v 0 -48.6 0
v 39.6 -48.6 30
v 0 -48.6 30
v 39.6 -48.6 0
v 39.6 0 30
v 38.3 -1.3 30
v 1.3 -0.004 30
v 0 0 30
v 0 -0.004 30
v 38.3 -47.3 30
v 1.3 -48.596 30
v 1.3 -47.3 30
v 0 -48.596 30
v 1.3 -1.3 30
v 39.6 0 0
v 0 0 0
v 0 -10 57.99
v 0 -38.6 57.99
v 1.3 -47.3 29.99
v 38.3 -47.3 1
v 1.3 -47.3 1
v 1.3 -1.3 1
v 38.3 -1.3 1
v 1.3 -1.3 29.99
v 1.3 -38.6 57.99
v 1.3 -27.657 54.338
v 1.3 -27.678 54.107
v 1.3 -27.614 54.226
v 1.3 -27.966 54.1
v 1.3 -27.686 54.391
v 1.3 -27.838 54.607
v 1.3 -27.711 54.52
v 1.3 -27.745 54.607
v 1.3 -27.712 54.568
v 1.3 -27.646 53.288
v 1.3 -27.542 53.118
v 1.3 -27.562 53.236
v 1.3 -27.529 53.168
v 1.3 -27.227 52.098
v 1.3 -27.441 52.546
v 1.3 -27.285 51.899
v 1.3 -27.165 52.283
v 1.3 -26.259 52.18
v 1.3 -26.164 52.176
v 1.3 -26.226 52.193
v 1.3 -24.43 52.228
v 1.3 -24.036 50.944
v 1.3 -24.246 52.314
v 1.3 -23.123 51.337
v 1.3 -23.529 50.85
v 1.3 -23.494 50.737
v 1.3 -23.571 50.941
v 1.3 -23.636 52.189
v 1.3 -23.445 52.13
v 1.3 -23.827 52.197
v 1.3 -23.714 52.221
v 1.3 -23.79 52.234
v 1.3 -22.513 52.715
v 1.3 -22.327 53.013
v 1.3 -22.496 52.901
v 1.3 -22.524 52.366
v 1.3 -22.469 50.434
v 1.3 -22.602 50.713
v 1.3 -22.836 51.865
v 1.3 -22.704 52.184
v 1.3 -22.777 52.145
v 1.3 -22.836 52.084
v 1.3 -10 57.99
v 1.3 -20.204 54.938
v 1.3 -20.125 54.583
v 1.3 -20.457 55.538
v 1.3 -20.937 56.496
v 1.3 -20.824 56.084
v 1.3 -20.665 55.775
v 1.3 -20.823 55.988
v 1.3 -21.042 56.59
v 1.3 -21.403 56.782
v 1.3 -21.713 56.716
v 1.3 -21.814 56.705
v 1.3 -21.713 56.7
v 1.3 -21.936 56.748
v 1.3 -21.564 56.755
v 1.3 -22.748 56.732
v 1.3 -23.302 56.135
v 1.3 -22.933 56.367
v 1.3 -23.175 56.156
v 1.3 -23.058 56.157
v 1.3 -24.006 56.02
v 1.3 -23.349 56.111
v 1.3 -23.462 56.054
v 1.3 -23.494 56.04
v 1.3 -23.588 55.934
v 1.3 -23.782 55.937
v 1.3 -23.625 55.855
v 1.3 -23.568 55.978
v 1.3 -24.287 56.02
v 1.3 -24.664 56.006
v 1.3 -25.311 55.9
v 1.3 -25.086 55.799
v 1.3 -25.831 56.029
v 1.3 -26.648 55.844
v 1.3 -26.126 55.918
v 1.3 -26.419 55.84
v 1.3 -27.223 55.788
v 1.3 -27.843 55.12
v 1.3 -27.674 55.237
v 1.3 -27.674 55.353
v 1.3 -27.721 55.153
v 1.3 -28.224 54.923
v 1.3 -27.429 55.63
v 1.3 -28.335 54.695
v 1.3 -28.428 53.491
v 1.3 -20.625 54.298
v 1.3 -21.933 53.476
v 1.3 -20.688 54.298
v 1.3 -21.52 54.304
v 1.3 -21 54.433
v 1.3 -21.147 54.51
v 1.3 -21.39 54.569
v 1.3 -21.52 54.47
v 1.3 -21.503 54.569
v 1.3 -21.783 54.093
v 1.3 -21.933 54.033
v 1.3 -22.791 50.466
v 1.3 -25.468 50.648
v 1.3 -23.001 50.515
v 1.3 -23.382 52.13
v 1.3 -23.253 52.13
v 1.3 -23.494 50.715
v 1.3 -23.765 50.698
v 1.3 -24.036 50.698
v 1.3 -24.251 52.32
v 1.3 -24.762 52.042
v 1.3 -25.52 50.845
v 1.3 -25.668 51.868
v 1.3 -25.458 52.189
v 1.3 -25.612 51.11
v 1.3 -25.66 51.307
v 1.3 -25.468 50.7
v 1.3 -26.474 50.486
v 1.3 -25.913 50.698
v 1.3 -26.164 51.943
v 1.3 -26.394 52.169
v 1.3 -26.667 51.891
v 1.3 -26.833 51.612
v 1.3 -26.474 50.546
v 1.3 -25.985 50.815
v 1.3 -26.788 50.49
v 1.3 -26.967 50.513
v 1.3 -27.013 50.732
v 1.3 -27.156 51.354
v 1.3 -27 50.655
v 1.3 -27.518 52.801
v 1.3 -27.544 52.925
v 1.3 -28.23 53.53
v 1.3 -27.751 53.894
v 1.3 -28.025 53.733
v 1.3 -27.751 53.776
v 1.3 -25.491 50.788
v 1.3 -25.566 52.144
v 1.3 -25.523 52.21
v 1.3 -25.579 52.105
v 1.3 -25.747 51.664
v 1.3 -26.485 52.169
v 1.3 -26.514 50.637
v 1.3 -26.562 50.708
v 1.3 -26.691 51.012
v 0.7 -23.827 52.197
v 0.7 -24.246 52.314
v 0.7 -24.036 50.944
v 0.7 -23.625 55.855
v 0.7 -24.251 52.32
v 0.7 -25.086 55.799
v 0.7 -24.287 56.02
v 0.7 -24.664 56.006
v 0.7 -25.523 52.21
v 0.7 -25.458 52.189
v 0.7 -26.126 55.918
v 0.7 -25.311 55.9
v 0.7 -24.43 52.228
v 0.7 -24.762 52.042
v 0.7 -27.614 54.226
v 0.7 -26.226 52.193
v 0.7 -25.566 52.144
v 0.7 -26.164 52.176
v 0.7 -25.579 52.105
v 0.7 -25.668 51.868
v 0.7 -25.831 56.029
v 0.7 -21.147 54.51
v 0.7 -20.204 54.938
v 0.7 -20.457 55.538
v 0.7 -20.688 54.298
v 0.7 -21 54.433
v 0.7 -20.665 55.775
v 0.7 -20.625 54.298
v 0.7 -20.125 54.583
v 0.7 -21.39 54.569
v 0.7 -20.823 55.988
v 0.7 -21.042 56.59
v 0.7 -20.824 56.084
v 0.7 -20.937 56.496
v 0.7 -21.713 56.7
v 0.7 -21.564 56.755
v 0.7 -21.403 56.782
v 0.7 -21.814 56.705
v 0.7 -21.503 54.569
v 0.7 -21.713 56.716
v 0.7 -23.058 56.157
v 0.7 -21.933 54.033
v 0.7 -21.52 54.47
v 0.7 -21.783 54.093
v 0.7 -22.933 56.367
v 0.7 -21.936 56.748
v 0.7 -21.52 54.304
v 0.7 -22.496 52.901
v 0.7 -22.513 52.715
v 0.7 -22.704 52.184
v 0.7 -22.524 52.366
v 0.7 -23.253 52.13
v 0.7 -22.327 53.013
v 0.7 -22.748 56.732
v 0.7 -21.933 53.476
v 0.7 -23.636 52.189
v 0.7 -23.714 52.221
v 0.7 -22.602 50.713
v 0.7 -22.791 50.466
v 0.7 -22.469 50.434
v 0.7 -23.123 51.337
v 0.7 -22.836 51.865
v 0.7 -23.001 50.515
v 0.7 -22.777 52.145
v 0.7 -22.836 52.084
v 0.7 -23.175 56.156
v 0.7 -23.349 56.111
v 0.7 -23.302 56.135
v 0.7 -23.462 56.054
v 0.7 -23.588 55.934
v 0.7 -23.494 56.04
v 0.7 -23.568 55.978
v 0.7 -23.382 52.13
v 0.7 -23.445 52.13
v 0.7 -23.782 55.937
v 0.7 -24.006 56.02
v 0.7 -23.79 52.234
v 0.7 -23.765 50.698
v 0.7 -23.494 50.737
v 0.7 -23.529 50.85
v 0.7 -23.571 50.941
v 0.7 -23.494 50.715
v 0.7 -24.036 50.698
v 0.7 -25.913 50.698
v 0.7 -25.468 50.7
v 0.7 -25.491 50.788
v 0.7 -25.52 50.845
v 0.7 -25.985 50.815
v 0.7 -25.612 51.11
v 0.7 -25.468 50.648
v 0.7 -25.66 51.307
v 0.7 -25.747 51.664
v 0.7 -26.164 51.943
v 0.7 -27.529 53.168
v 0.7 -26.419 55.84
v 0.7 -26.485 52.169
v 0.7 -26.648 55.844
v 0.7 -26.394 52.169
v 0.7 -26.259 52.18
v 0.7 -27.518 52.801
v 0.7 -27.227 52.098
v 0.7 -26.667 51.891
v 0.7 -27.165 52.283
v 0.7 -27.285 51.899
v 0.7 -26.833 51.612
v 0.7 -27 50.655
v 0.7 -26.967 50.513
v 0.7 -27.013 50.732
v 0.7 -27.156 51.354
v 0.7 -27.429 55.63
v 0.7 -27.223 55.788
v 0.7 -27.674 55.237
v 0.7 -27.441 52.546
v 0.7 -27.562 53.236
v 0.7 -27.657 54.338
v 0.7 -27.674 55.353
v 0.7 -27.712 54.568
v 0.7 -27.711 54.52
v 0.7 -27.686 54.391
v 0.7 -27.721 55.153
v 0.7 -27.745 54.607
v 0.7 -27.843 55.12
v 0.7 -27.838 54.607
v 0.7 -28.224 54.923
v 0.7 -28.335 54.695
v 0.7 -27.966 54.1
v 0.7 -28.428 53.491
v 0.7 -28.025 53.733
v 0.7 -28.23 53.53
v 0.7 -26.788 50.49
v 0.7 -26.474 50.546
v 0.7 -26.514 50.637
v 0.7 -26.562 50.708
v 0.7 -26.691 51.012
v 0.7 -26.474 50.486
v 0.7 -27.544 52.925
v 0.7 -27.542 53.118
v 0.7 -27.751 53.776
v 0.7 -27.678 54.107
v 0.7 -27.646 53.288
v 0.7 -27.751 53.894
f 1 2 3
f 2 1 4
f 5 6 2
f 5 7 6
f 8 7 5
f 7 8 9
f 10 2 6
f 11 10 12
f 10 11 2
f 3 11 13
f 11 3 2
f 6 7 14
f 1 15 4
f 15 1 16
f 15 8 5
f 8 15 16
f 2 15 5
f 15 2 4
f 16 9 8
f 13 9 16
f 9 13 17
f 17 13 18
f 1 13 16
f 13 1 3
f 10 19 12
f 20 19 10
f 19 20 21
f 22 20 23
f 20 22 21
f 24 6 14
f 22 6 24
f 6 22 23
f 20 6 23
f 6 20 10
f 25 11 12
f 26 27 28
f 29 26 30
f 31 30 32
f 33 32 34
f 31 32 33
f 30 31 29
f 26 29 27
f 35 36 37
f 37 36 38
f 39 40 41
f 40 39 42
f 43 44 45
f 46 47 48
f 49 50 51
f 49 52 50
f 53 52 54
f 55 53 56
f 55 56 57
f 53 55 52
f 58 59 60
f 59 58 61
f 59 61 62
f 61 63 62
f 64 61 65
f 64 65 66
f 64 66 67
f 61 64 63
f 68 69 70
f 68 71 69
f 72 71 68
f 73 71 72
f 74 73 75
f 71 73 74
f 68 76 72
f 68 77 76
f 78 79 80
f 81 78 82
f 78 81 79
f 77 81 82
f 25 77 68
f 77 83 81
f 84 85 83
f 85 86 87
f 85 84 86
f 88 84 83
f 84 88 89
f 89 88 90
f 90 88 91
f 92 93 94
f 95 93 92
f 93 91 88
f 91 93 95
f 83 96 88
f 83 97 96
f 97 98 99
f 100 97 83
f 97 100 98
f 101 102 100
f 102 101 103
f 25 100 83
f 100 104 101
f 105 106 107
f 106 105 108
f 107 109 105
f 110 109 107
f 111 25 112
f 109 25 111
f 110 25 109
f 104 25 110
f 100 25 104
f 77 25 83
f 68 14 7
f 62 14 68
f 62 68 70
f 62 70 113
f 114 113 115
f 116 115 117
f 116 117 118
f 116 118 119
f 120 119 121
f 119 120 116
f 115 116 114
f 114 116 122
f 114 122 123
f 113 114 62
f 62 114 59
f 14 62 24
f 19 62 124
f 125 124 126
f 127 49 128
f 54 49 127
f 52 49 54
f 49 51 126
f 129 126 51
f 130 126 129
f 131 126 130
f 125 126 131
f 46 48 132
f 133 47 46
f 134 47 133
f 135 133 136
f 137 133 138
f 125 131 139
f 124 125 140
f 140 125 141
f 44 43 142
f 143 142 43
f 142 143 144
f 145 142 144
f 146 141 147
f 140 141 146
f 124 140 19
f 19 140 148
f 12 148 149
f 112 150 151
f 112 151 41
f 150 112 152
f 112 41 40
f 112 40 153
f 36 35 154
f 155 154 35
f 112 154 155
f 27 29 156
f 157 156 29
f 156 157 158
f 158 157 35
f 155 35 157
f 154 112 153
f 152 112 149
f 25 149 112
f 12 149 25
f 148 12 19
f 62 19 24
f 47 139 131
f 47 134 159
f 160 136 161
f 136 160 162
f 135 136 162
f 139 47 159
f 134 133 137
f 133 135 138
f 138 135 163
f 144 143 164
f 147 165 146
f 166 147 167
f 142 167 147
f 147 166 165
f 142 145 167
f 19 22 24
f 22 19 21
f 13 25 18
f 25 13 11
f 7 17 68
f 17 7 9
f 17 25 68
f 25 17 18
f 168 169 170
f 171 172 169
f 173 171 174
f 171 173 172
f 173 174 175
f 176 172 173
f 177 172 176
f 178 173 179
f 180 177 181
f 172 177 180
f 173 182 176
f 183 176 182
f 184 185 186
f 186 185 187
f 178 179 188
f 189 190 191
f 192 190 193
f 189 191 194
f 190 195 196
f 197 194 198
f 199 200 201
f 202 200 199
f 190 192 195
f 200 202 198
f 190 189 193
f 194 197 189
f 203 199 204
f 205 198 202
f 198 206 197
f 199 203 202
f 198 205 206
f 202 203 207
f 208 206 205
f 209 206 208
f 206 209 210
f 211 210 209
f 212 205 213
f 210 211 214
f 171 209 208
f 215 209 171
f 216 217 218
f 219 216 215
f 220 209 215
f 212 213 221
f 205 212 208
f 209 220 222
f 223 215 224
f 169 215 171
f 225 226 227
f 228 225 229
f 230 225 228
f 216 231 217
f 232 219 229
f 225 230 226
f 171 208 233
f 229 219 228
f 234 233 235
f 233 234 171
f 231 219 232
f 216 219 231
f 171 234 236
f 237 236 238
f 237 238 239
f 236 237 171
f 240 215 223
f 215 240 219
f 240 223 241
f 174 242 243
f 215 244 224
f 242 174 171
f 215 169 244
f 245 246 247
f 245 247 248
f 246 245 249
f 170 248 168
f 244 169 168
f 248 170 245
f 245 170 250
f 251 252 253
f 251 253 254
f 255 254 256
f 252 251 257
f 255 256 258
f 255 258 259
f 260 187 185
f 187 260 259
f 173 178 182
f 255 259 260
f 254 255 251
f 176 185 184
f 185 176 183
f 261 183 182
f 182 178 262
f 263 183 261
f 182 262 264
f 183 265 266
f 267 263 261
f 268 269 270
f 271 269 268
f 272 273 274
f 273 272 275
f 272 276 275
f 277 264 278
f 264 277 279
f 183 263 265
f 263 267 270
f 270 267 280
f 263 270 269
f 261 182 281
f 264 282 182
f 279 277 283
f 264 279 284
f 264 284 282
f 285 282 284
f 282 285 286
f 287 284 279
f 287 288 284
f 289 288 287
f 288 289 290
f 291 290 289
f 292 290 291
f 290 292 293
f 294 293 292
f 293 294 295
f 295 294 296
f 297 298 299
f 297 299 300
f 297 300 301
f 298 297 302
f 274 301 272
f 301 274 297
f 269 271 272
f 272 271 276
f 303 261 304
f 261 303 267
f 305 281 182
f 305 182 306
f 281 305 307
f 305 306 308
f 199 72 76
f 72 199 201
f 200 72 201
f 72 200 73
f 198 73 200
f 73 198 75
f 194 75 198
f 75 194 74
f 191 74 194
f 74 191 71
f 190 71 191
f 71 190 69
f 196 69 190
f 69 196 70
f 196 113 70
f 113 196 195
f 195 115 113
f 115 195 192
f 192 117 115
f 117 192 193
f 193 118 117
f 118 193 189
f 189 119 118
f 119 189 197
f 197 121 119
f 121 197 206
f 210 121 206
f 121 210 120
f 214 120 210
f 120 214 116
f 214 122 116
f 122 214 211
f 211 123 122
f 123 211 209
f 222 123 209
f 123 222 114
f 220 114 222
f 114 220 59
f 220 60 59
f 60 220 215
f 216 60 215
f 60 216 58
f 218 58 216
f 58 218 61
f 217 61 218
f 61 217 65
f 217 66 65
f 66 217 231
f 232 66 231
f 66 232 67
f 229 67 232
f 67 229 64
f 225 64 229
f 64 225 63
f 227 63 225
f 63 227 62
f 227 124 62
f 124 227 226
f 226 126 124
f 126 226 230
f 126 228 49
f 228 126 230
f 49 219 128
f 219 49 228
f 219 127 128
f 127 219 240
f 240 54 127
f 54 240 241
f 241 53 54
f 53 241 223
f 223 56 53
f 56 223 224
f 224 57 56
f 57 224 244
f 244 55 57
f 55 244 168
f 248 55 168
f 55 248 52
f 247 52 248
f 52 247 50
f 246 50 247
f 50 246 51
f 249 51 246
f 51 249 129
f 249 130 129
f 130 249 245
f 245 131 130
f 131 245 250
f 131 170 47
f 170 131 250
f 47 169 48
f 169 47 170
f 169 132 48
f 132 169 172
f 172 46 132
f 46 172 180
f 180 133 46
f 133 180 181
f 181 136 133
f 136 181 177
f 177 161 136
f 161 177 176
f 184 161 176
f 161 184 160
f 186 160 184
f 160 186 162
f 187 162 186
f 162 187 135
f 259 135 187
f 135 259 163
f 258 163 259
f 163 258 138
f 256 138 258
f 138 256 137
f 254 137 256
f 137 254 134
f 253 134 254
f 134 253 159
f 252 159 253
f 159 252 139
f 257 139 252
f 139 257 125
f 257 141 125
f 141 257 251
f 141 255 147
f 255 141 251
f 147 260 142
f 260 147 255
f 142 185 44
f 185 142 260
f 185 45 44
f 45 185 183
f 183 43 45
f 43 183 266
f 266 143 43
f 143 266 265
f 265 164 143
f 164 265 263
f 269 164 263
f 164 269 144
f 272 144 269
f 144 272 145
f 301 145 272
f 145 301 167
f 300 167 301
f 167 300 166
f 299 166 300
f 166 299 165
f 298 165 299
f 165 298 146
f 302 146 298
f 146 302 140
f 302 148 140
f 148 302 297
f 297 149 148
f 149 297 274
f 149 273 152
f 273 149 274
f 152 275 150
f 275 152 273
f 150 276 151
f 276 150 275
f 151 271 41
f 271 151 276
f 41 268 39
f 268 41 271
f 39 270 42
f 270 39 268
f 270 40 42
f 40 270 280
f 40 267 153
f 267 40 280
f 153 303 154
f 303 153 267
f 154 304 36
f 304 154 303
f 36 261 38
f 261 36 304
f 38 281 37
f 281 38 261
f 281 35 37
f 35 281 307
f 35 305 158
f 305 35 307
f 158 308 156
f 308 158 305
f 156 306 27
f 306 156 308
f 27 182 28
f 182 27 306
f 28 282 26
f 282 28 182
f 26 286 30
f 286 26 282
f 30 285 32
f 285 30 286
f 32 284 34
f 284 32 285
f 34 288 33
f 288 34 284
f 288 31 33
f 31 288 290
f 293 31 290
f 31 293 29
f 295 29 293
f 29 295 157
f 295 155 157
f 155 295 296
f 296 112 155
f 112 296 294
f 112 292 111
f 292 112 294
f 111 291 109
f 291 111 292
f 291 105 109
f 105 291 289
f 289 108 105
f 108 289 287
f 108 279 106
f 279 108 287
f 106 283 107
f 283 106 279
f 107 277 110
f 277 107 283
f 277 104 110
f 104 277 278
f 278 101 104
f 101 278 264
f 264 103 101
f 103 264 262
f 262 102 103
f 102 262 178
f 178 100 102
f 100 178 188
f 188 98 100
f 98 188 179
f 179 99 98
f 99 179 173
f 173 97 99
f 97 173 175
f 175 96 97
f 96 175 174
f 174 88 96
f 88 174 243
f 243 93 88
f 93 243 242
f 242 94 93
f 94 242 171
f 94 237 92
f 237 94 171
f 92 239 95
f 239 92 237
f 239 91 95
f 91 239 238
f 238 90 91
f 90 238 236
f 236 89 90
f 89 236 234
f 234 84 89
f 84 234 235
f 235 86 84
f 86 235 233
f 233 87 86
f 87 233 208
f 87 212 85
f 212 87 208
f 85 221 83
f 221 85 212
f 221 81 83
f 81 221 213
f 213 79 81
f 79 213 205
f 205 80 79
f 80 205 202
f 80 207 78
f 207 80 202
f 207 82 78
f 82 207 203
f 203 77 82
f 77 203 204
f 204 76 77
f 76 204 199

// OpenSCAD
floor_thickness = 1;
wall_thickness = 1.3;
wall_height = 30; // [25:40]
tab_height = 28;
icon = "sheeps"; // [none:None,abbey:Abbey and Mayor,bridges:Bridges Castles and Bazaar,catapult:Catapult,count:Count,crop:Crop Circles,ferry:Ferries,flyer:Flyers,gold:Gold Mines,inns:Inns and Cathedrals,king:King,mage:Mage and Witch,messages:Messages,plague:Plague,princess:Princess and Dragon,robbers:Robbers,spielbox:Spielbox,tower:Tower,traders:Traders and Builders,wheel:Wheel of Fortune,sheeps:Sheeps and Hills]

inset = 0.9;

inside_length = 37; //27.5

/* [Hidden] */
length = inside_length + wall_thickness * 2;
width = 46 + wall_thickness * 2;
fudge = 0.1;

rotate(a=[0,0,-90]) {
difference () {
union () {
difference () {
	cube([width,length,wall_height]);
	translate ([wall_thickness,wall_thickness,floor_thickness]) {
		cube([46,inside_length,wall_height]);
	}
};
translate([0,wall_thickness,wall_height-.01])
rotate(a=[90,0,0])
linear_extrude(height = wall_thickness)
	polygon(points=[[0,0],[10,tab_height],[width - 10,tab_height],[width,0]]);
};

translate([width/2,1.5 - inset + fudge,wall_height + tab_height - 5])
rotate(a=[90,0,180])
	if (icon == "abbey")
		abbey(inset + fudge);
	else if (icon == "bridges")
		bridges(inset + fudge);
	else if (icon == "catapult")
		catapult(inset + fudge);
	else if (icon == "count")
		count(inset + fudge);
	else if (icon == "crop")
		crop(inset + fudge);
	else if (icon == "ferry")
		ferry(inset + fudge);
	else if (icon == "flyer")
		flyer(inset + fudge);
	else if (icon == "gold")
		gold(inset + fudge);
	else if (icon == "inns")
		inns(inset + fudge);
	else if (icon == "king")
		king(inset + fudge);
	else if (icon == "mage")
		mage(inset + fudge);
	else if (icon == "messages")
		messages(inset + fudge);
	else if (icon == "plague")
		plague(inset + fudge);
	else if (icon == "princess")
		princess(inset + fudge);
	else if (icon == "robbers")
		robbers(inset + fudge);
	else if (icon == "spielbox")
		spielbox(inset + fudge);
	else if (icon == "tower")
		tower(inset + fudge);
	else if (icon == "traders")
		traders(inset + fudge);
	else if (icon == "wheel")
		wheel(inset + fudge);
	else if (icon == "m")
		m(inset + fudge);
    else if (icon == "sheeps")
		sheeps(inset + fudge);
};
};

module abbey(h) {
  scale([25.4/90, -25.4/90, 1])
  {
    linear_extrude(height=h)
      polygon([[4.699935,4.819935],[5.634285,5.066798],[6.414915,5.744925],[6.978016,6.760539],[7.259905,8.019895],[7.594905,8.639885],[8.259895,8.899885],[11.779845,8.899885],[12.489835,8.589885],[12.779835,7.859895],[12.779835,-1.499985],[12.594835,-2.114975],[12.139845,-2.579965],[0.659995,-8.739885],[0.369995,-8.864885],[0.019995,-8.899885],[-0.659995,-8.739885],[-12.139845,-2.579965],[-12.594835,-2.114975],[-12.779835,-1.499985],[-12.779835,7.859895],[-12.489845,8.589885],[-11.779845,8.899885],[-9.859875,8.899885],[-9.194885,8.639885],[-8.859885,8.019895],[-8.819885,8.019895],[-8.819885,5.379925],[-8.531781,3.944327],[-7.744905,2.774965],[-6.575549,1.988103],[-5.139935,1.699975],[-5.019935,1.699975],[-3.641211,1.967463],[-2.509965,2.699965],[-1.723740,3.792454],[-1.379985,5.139935],[-1.379985,7.859895],[-1.359985,7.939895],[-1.339985,8.019895],[-1.004985,8.639885],[-0.339995,8.899885],[1.099985,8.899885],[1.764975,8.639885],[2.099975,8.019895],[2.388076,6.760539],[2.964965,5.744925],[3.759314,5.066813],[4.699935,4.819935]]);
};
};
module bridges(h) {
  scale([25.4/90, -25.4/90, 1])
  {
    linear_extrude(height=h)
      polygon([[-13.159830,7.079910],[-9.959870,7.079910],[-9.959870,5.199930],[-9.738297,3.193399],[-9.181121,1.361236],[-8.288330,-0.296557],[-7.059910,-1.779980],[-5.576498,-3.008394],[-3.918709,-3.901191],[-2.086542,-4.458373],[-0.080000,-4.679940],[0.120000,-4.679940],[2.128714,-4.458365],[3.964936,-3.901184],[5.628668,-3.008391],[7.119910,-1.779980],[8.356128,-0.296557],[9.254860,1.361236],[9.816107,3.193399],[10.039870,5.199930],[10.039870,7.079910],[13.159830,7.079910],[13.159830,-7.079910],[-13.159830,-7.079910]]);
};
};
module catapult(h) {
difference()
{
  scale([25.4/90, -25.4/90, 1])
  {
    linear_extrude(height=h)
         polygon([[-9.779880,8.079900],[-8.689890,9.349880],[-7.059910,9.839870],[-5.429930,9.349880],[-4.339950,8.079900],[4.699940,8.079900],[5.789920,9.349880],[7.419900,9.839870],[9.049880,9.349880],[10.139870,8.079900],[10.939860,8.079900],[10.939860,5.399930],[10.059870,5.399930],[9.289880,4.484940],[8.219890,3.959950],[2.059970,-5.119930],[1.939970,-5.119930],[1.939970,-5.159930],[0.060000,-5.159930],[0.060000,-9.799870],[-0.020000,-9.819870],[-0.100000,-9.839870],[-1.266868,-9.595477],[-2.234970,-8.934880],[-2.895598,-7.966755],[-3.139960,-6.799910],[-2.956215,-5.775535],[-2.449970,-4.904940],[-1.688738,-4.251809],[-0.739990,-3.879950],[-0.739990,5.399930],[-4.419950,5.399930],[-5.514930,4.274940],[-7.059910,3.839950],[-8.604890,4.274950],[-9.699880,5.399930],[-10.939860,5.399930],[-10.939860,8.079900]]);
	};
  scale([25.4/90, -25.4/90, 1])
  {
    linear_extrude(height=h)
           polygon([[5.419930,4.639940],[5.069930,5.004940],[4.779940,5.399930],[1.939970,5.399930],[1.939970,-0.439990]]);
	};
};
};
module count(h) {
  scale([25.4/90, -25.4/90, 1])
  {
    linear_extrude(height=h)
      polygon([[-11.179855,-2.259990],[-11.259855,9.579860],[11.259855,9.539860],[11.179855,-3.899970],[10.659865,-3.899970],[9.459875,-1.779990],[9.499875,-1.659990],[9.939875,-1.340000],[9.979875,-0.220010],[9.739885,0.099980],[9.739885,0.979970],[9.379885,1.499970],[9.379885,1.579970],[9.459885,1.579970],[9.459885,1.699970],[9.499885,1.699970],[9.539885,2.059970],[9.499885,2.059970],[9.499885,2.139970],[9.539885,2.139970],[9.539885,2.659960],[8.459895,2.659960],[7.859905,2.739960],[7.859905,1.859970],[7.899905,1.859970],[7.899905,1.779970],[7.859905,1.739970],[7.819905,1.659970],[7.819905,1.579970],[6.739925,-0.500000],[6.699925,-1.059990],[6.619925,-0.460000],[5.779935,1.539970],[5.779935,1.619970],[5.739935,1.619970],[5.819935,1.739970],[5.939935,1.739970],[5.979935,2.939960],[5.859935,3.019960],[5.859935,3.099960],[5.899935,3.099960],[5.899935,3.139960],[5.699935,3.179960],[5.459935,3.219960],[5.459935,3.419960],[5.659935,3.419960],[5.619935,3.619960],[5.499935,3.619960],[5.459935,3.539960],[5.339935,3.619960],[5.339935,4.139950],[5.219945,4.139950],[5.259945,4.259950],[5.339945,4.299950],[5.339945,4.819940],[2.979985,4.899940],[2.979985,4.859940],[3.059985,4.819940],[3.059985,4.699940],[2.979985,4.699940],[2.979985,2.619970],[3.174975,2.169980],[2.619985,1.779980],[1.140005,1.384990],[-0.339975,0.899990],[-0.379975,0.740000],[-0.379975,-1.939970],[-0.299975,-1.979970],[-0.219975,-2.259970],[-0.379975,-2.419960],[-0.379975,-3.099960],[-0.339975,-3.099960],[-0.339975,-3.259950],[-0.419975,-3.379950],[-0.459975,-5.979920],[-0.259975,-6.139920],[-0.699975,-7.579900],[-0.899965,-7.739900],[-2.059955,-7.939890],[-2.339955,-7.979890],[-2.419955,-8.259890],[-2.374955,-8.359890],[-2.419955,-8.459890],[-2.419955,-8.659880],[-2.269955,-8.559880],[-2.179955,-8.459880],[-2.084955,-8.269880],[-1.779955,-8.019880],[-1.699955,-8.019880],[-1.714955,-8.199880],[-1.699955,-8.379880],[-1.539965,-8.209880],[-1.379965,-8.099880],[-1.299965,-8.179880],[-1.579965,-8.584880],[-1.859955,-8.899870],[-2.104955,-9.284870],[-2.379955,-9.579860],[-2.539945,-9.579860],[-2.539945,-8.459880],[-2.619945,-8.389880],[-2.579945,-8.259880],[-2.619945,-7.939880],[-2.979945,-7.939880],[-4.939915,-7.499890],[-4.939915,-7.219890],[-4.859915,-7.179890],[-4.859915,-7.019890],[-4.739925,-6.939890],[-4.699925,-4.099920],[-4.819915,-4.099920],[-4.819915,-3.899930],[-4.779915,-3.899930],[-4.739915,-2.979940],[-4.859905,-2.939940],[-4.859905,-2.779940],[-4.779905,-2.739940],[-4.779905,-1.419960],[-4.859905,1.620000],[-6.179895,1.620000],[-6.219895,-1.739950],[-7.499875,-2.539940],[-7.979865,-2.499940],[-7.979865,-2.059950],[-7.939865,-2.059950],[-7.939865,-1.859950],[-8.699855,-2.379940]]);
	};
};

module crop(h) {
  scale([25.4/90, -25.4/90, 1])
	union() {
    linear_extrude(height=h)
      polygon([[-0.719995,6.579910],[-0.879995,8.099890],[-0.550625,9.979249],[0.434995,11.524850],[2.073091,12.627965],[4.359945,13.179830],[4.399945,12.139840],[2.678081,11.689225],[1.424975,10.814860],[0.659360,9.513005],[0.399995,7.779900],[0.439995,6.819910],[-0.020005,5.874920],[-0.719995,6.579910]]);
    linear_extrude(height=h)
      polygon([[0.159995,4.779940],[0.039995,5.339930],[0.259995,5.844920],[0.839985,6.019920],[1.619975,5.829920],[2.519965,5.219930],[3.464955,3.674950],[4.199945,1.739980],[1.909975,2.884960],[0.903731,3.579336],[0.159995,4.779940]]);
    linear_extrude(height=h)
      polygon([[-2.719965,5.179930],[-1.834975,5.789920],[-1.039985,5.979920],[-0.479995,5.804920],[-0.279995,5.299930],[-0.399995,4.739940],[-1.137493,3.539961],[-2.129975,2.849960],[-4.399945,1.739980],[-3.664955,3.639950],[-2.719965,5.179930]]);
    linear_extrude(height=h)
      polygon([[-2.679965,2.259970],[-1.799985,2.869960],[-1.039985,3.059960],[-0.459995,2.864960],[-0.240005,2.339970],[-0.359995,1.819970],[-1.079993,0.637500],[-2.069975,-0.050000],[-4.319945,-1.139990],[-3.604955,0.754990],[-2.679965,2.259970]]);
    linear_extrude(height=h)
      polygon([[0.199995,1.739980],[0.079995,2.299970],[0.299995,2.804960],[0.879985,2.979960],[1.659975,2.789960],[2.559965,2.179970],[3.504955,0.639990],[4.239945,-1.259990],[1.919975,-0.090000],[0.921231,0.585001],[0.199995,1.739980]]);
    linear_extrude(height=h)
      polygon([[0.199995,-1.179990],[0.079995,-0.619990],[0.299995,-0.095000],[0.879985,0.100000],[1.674975,-0.090000],[2.559965,-0.699990],[3.504955,-2.259970],[4.239945,-4.179950],[1.949975,-3.069960],[0.943731,-2.379960],[0.199995,-1.179990]]);
    linear_extrude(height=h)
      polygon([[-2.679965,-0.739990],[-1.794985,-0.130000],[-0.999995,0.060000],[-0.439995,-0.115000],[-0.240005,-0.619990],[-0.359995,-1.179990],[-1.091242,-2.362460],[-2.069975,-3.049960],[-4.319945,-4.139950],[-3.604955,-2.244970],[-2.679965,-0.739990]]);
    linear_extrude(height=h)
      polygon([[-2.679965,-3.659950],[-1.794985,-3.049960],[-0.999995,-2.859960],[-0.439995,-3.034960],[-0.240005,-3.539960],[-0.359995,-4.099950],[-1.097492,-5.306166],[-2.089975,-6.009920],[-4.359945,-7.139910],[-3.624955,-5.219930],[-2.679965,-3.659950]]);
    linear_extrude(height=h)
      polygon([[0.199995,-4.139950],[0.079995,-3.579960],[0.279995,-3.074960],[0.839985,-2.899960],[1.634975,-3.089960],[2.519965,-3.699950],[3.464955,-5.239930],[4.199945,-7.139910],[1.929975,-6.029920],[0.937481,-5.339920],[0.199995,-4.139950]]);
    linear_extrude(height=h)
      polygon([[0.319995,-6.939910],[0.199995,-6.459920],[0.394995,-5.989920],[0.919985,-5.819930],[2.439965,-6.539920],[3.269955,-7.934900],[3.919945,-9.659880],[1.879975,-8.644890],[0.983731,-8.011756],[0.319995,-6.939910]]);
    linear_extrude(height=h)
      polygon([[-2.479975,-6.539920],[-1.679985,-5.999920],[-0.999995,-5.819930],[-0.474995,-5.989930],[-0.279995,-6.459920],[-0.399995,-6.939910],[-1.063743,-8.011756],[-1.959975,-8.644890],[-3.999955,-9.659880],[-3.329955,-7.934900],[-2.479975,-6.539920]]);
    linear_extrude(height=h)
      polygon([[0.199995,-9.259880],[0.079995,-8.859890],[0.244995,-8.499890],[0.679985,-8.379890],[1.254985,-8.509890],[1.919975,-8.939890],[2.614965,-10.064870],[3.159955,-11.459850],[1.484975,-10.644860],[0.746856,-10.137972],[0.199995,-9.259880]]);
    linear_extrude(height=h)
      polygon([[-1.999975,-9.019890],[-1.349985,-8.534890],[-0.759995,-8.379890],[-0.359995,-8.504890],[-0.200005,-8.899890],[-0.280005,-9.259880],[-0.756882,-10.174226],[-1.454995,-10.724860],[-3.079975,-11.619850],[-2.629975,-10.184870],[-1.999985,-9.019890]]);
    linear_extrude(height=h)
      polygon([[-1.399985,-11.139860],[-0.939995,-10.619860],[-0.479995,-10.459870],[-0.225005,-10.559870],[-0.120005,-10.899860],[-0.120005,-11.019860],[-0.724995,-12.249840],[-1.719985,-13.179830],[-1.634985,-12.069850],[-1.399985,-11.139860]]);
    linear_extrude(height=h)
      polygon([[-0.000005,-11.019860],[-0.000005,-10.899860],[0.104995,-10.559870],[0.359995,-10.459870],[0.819985,-10.619860],[1.279985,-11.139860],[1.534975,-12.069850],[1.639975,-13.179830],[0.624985,-12.249840],[-0.000005,-11.019860]]);
};
};

module ferry(h)
{
  scale([25.4/90, -25.4/90, 1]) union()
  {
    linear_extrude(height=h)
      polygon([[-8.499890,3.339955],[8.499890,3.339955],[12.339840,-1.099985],[12.339840,-3.339955],[0.300000,-2.979965],[-12.339840,-3.339955],[-12.339840,-1.099985]]);
  }
}

module flyer(h)
{
  scale([25.4/90, -25.4/90, 1]) union()
  {
    linear_extrude(height=h)
      polygon([[-12.739835,4.059950],[-11.049855,3.934950],[-9.419875,3.899950],[-4.969316,4.251811],[-0.904985,5.274930],[2.791826,6.920541],[6.139925,9.139880],[6.539915,8.579890],[5.219935,7.699900],[5.981155,5.658682],[7.109905,3.849950],[8.583620,2.266228],[10.379865,0.899990],[12.699835,1.019990],[12.739835,0.500000],[10.619865,0.380000],[8.859885,-2.234970],[8.299895,-4.819940],[8.559885,-6.619910],[9.299875,-8.419890],[11.139855,-8.579890],[11.099855,-9.139880],[7.626766,-8.602691],[4.247433,-7.673638],[0.961853,-6.352721],[-2.229975,-4.639940],[-8.002401,-0.556234],[-12.739835,4.059950]]);
  }
}

module gold(h)
{
  scale([25.4/90, -25.4/90, 1]) union()
  {
    linear_extrude(height=h)
      polygon([[-8.759885,3.519950],[8.759885,3.519950],[5.959925,-3.519950],[-5.959925,-3.519950]]);
  }
}

module inns(h)
{
  scale([25.4/90, -25.4/90, 1]) union()
  {
    linear_extrude(height=h)
      polygon([[-10.639865,9.759870],[-10.874865,10.429870],[-10.959865,11.039860],[-10.514865,12.104840],[-9.319885,12.479840],[-9.239885,12.479840],[-3.599955,12.479840],[-2.864965,12.114840],[-2.279975,11.239850],[-0.000005,6.599910],[0.039995,6.599910],[2.279965,11.239850],[2.864955,12.114840],[3.599955,12.479840],[9.279875,12.479840],[9.359875,12.479840],[10.534865,12.104840],[10.959855,11.039860],[10.639865,9.759870],[6.519915,1.039990],[8.989885,0.624990],[11.039855,-0.000000],[11.834845,-0.539990],[12.119845,-1.319980],[11.899845,-2.119970],[11.199855,-3.039960],[7.959895,-5.389930],[3.639955,-7.079910],[3.386824,-9.374862],[2.724965,-11.069860],[1.620590,-12.119824],[0.039995,-12.479840],[-0.000005,-12.479840],[-1.586864,-12.119835],[-2.704965,-11.069860],[-3.380589,-9.374863],[-3.639955,-7.079910],[-7.959905,-5.389930],[-11.199855,-3.039960],[-11.899855,-2.119970],[-12.119845,-1.319980],[-11.834845,-0.539990],[-11.039865,-0.000000],[-8.969885,0.624990],[-6.479915,1.039990]]);
  }
}

module king(h)
{
  scale([25.4/90, -25.4/90, 1]) union()
  {
    linear_extrude(height=h)
      polygon([[-10.619865,7.699900],[10.619865,7.699900],[10.579865,-0.499990],[11.259855,-7.579900],[7.859895,-0.739990],[5.619925,-7.619900],[2.859965,-0.739990],[0.019995,-7.699900],[-2.819965,-0.739990],[-5.619925,-7.619900],[-7.859905,-0.739990],[-11.259855,-7.579900],[-10.579865,-0.499990]]);
  }
}

module mage(h)
{
  scale([25.4/90, -25.4/90, 1]) union()
  {
    linear_extrude(height=h)
      polygon([[-10.799860,8.439890],[-10.558457,8.972388],[-9.950498,9.459884],[-7.634900,10.299870],[-4.201825,10.869861],[0.000000,11.079860],[4.201810,10.869861],[7.634900,10.299870],[9.950479,9.459884],[10.558445,8.972388],[10.799860,8.439890],[10.503604,7.828029],[9.659870,7.264910],[6.599910,6.359920],[0.000000,-11.079860],[-6.639920,6.359920],[-9.679880,7.264910],[-10.509866,7.828033],[-10.799860,8.439890]]);
  }
}

module messages(h)
{
  scale([25.4/90, -25.4/90, 1]) union()
  {
    linear_extrude(height=h)
      polygon([[-11.839845,6.379920],[-11.839845,6.739920],[-11.384855,8.229900],[-9.759875,9.179880],[7.839905,9.179880],[6.804275,8.936135],[6.124925,8.489890],[5.639925,7.259910],[5.694925,6.819920],[5.839925,6.379920]]);
    linear_extrude(height=h)
      polygon([[10.719865,-9.179880],[7.479905,-9.179880],[-6.199915,-9.099880],[-7.021164,-8.839249],[-7.579905,-8.094890],[-7.999895,-5.379930],[-7.964895,-4.159940],[-7.839895,-2.819960],[-7.434905,1.009990],[-7.239905,4.419950],[-7.279905,5.579930],[6.919915,5.539930],[6.959915,5.579930],[6.454915,6.389920],[6.279925,7.379910],[6.289925,7.699900],[6.359925,8.019900],[7.019925,8.689890],[8.039905,8.939890],[8.384905,8.889890],[8.639895,8.779890],[9.198625,8.149900],[9.569885,7.189910],[9.839885,4.459950],[9.659885,1.059990],[9.239895,-2.819960],[9.039895,-5.819920],[9.429895,-8.204890],[9.951116,-8.874241],[10.719875,-9.179880]]);
    linear_extrude(height=h)
      polygon([[10.959855,-9.179880],[10.432975,-8.910472],[10.014875,-8.224890],[9.639875,-6.339920],[9.639875,-6.099920],[11.079855,-6.099920],[11.639855,-6.929910],[11.839845,-7.819900],[11.624855,-8.634890],[10.959855,-9.179880]]);
  }
}

module plague(h)
{
  scale([25.4/90, -25.4/90, 1]) union()
  {
    linear_extrude(height=h)
      polygon([[-2.399970,-9.279885],[-1.919970,-8.879885],[-1.999970,-7.799905],[-5.389930,-7.099915],[-8.599890,-6.039925],[-9.359880,-5.359935],[-9.229880,-5.079935],[-8.799890,-4.799935],[-5.854920,-4.359945],[-2.159970,-4.159945],[-2.199970,-3.319955],[-6.233050,-2.088710],[-9.384880,-0.369995],[-11.644226,1.843736],[-12.999830,4.559945],[-11.739850,3.414963],[-10.239870,2.719965],[-8.984880,2.604965],[-7.639900,2.159975],[-7.439900,2.159975],[-5.709930,2.059975],[-3.559950,1.959975],[-2.624970,1.999975],[-1.959970,2.159975],[-1.784980,2.564965],[-1.279980,2.879965],[-1.054980,3.414955],[-0.439990,3.919945],[-0.399990,4.279945],[-0.684990,5.244935],[-1.479980,6.119925],[-2.559972,6.834914],[-3.519950,7.879895],[-3.759950,8.479885],[-3.149960,9.209875],[-1.039990,9.759875],[0.574990,10.104865],[2.279970,10.239865],[4.189305,10.068605],[6.274920,9.499875],[8.563000,8.451145],[11.079860,6.839915],[9.574880,5.869925],[8.159900,4.719935],[6.999910,2.639965],[6.559920,-0.279995],[6.569920,-1.029985],[6.639920,-1.839975],[6.994910,-2.639965],[7.199910,-3.559955],[8.379890,-3.539955],[9.559880,-3.519955],[10.939860,-3.559955],[12.319840,-3.719955],[12.839840,-3.989945],[12.999830,-4.319945],[12.399840,-5.119935],[8.079900,-7.079905],[8.514890,-7.999895],[9.399880,-8.559895],[9.814870,-8.859885],[9.479880,-9.159885],[9.019880,-9.304885],[8.559890,-9.359885],[8.279890,-9.334885],[7.999900,-9.279885],[6.584920,-10.029875],[4.479940,-10.239865],[-1.999970,-10.239865],[-2.799960,-9.894875],[-2.399970,-9.279885]]);
  }
}

module princess(h)
{
  scale([25.4/90, -25.4/90, 1]) union()
  {
    linear_extrude(height=h)
      polygon([[-6.399915,10.639865],[-6.519915,11.359855],[-5.994925,12.594835],[-4.599935,13.079835],[-1.879975,13.039835],[0.020005,13.019835],[1.919975,12.999835],[4.639945,12.999835],[6.014925,12.494835],[6.519915,11.239855],[6.399915,10.479865],[4.279945,4.439945],[3.909955,3.359955],[3.479955,2.159975],[3.319955,1.679975],[6.159925,1.679975],[7.399905,1.159985],[7.919895,-0.079995],[7.919895,-0.119995],[7.399905,-1.359985],[6.159925,-1.879975],[2.239975,-1.879975],[2.319975,-2.079975],[2.844965,-4.059945],[3.039965,-6.399915],[2.812451,-8.945491],[2.179975,-11.074855],[1.217479,-12.536694],[0.000005,-13.079835],[-1.211239,-12.531054],[-2.159975,-11.059855],[-2.778715,-8.928616],[-2.999955,-6.399915],[-2.824965,-4.094945],[-2.319965,-2.119975],[-2.199975,-1.879975],[-6.119915,-1.879975],[-7.379905,-1.359985],[-7.919895,-0.119995],[-7.919895,-0.079995],[-7.379905,1.159985],[-6.119915,1.679975],[-3.319955,1.679975],[-3.479955,2.159975],[-3.929945,3.414955],[-4.319945,4.519945]]);
  }
}

module robbers(h)
{
  scale([25.4/90, -25.4/90, 1]) union()
  {
    linear_extrude(height=h)
      polygon([[-5.559925,-11.539845],[-5.649925,-11.369855],[-5.679925,-11.139855],[-4.699945,-8.854885],[-2.999965,-6.899905],[-3.539955,-6.454915],[-3.719955,-5.739925],[-3.554955,-5.034935],[-3.119965,-4.539935],[-6.221802,-2.188080],[-7.281945,-0.850444],[-8.014905,0.594995],[-8.840516,3.700587],[-9.039885,7.019915],[-8.994885,9.259885],[-8.919885,11.499855],[-8.093650,12.104850],[-6.509915,12.499845],[-2.839965,12.779835],[2.859955,12.739835],[7.359905,12.579845],[8.504885,11.934845],[8.959885,10.539865],[9.014885,9.444885],[9.039885,8.379895],[8.723004,4.544326],[7.734895,1.094985],[6.019285,-1.941831],[3.519955,-4.539935],[4.079945,-4.969935],[4.279945,-5.699925],[4.099945,-6.364915],[3.559955,-6.819905],[6.009915,-9.264875],[6.552400,-10.267971],[6.719915,-11.139855],[6.499915,-12.009845],[5.919925,-12.699835],[5.879925,-12.699835],[5.184925,-11.934845],[4.159945,-11.139855],[4.119945,-11.139855],[3.509955,-11.414845],[2.959955,-12.019845],[2.264957,-12.594818],[1.599975,-12.779835],[1.199985,-12.724835],[0.799985,-12.579835],[-0.090005,-12.004845],[-0.919995,-11.219855],[-1.379985,-10.894855],[-1.839975,-10.779855],[-2.679965,-11.099855],[-3.539955,-11.549845],[-4.519945,-11.699845],[-5.559935,-11.539845]]);
  }
}

module spielbox(h)
{
  scale([25.4/90, -25.4/90, 1]) union()
  {
    linear_extrude(height=h)
      polygon([[10.599865,-2.359970],[-0.000005,-10.079870],[-10.599865,-2.359970],[-6.559915,10.079870],[6.559915,10.079870]]);
  }
}

module tower(h)
{
  scale([25.4/90, -25.4/90, 1]) union()
  {
    linear_extrude(height=h)
      polygon([[-4.799935,11.259855],[4.799935,11.259855],[4.119945,-6.379915],[5.599925,-6.379915],[5.839925,-11.259855],[4.039945,-11.259855],[4.039945,-9.979875],[2.319965,-9.979875],[2.319965,-11.259855],[0.799985,-11.259855],[0.799985,-9.979875],[-0.799995,-9.979875],[-0.799995,-11.259855],[-2.319975,-11.259855],[-2.319975,-9.979875],[-4.039945,-9.979875],[-4.039945,-11.259855],[-5.839925,-11.259855],[-5.599925,-6.379915],[-4.119945,-6.379915]]);
  }
}

module traders(h)
{
  scale([25.4/90, -25.4/90, 1]) union()
  {
    linear_extrude(height=h)
      polygon([[-3.919950,6.399920],[-3.559950,6.849910],[-2.959960,6.999910],[-2.294970,6.794910],[-1.959970,6.199920],[-1.999970,4.599940],[0.854990,4.849940],[3.679950,4.919940],[4.999940,4.899940],[6.319920,4.879940],[6.399920,6.319920],[6.739910,6.824910],[7.439900,6.999910],[8.099900,6.824910],[8.399890,6.319920],[8.399890,6.279920],[8.439890,5.519930],[8.973619,4.603694],[9.769870,3.859950],[10.521096,2.876219],[10.919860,1.239980],[10.959860,0.559990],[10.804977,-1.239979],[10.319870,-2.679970],[10.359870,-2.679970],[11.250462,-2.983704],[11.844850,-3.489960],[12.279840,-4.839940],[12.199840,-5.319930],[11.664850,-6.274920],[10.559860,-6.719910],[9.879870,-6.599920],[9.249880,-6.039920],[9.039880,-5.239930],[9.279880,-4.439940],[9.999870,-4.119950],[10.569860,-4.274950],[10.959860,-4.639940],[10.799860,-5.239930],[10.174870,-4.924940],[9.879870,-5.119940],[9.879870,-5.239930],[10.124870,-5.689930],[10.639860,-5.839930],[11.079860,-5.679930],[11.349850,-5.304930],[11.439850,-4.839940],[11.084860,-3.944950],[9.919870,-3.439960],[9.879870,-3.399960],[8.814870,-4.435560],[7.449900,-5.114940],[3.999950,-5.599930],[0.245000,-5.294930],[-3.719950,-4.599940],[-3.679950,-4.879940],[-3.888714,-5.801790],[-4.419940,-6.344920],[-5.879920,-6.999910],[-6.384920,-5.759930],[-6.559920,-4.399940],[-11.679850,-3.079960],[-12.159840,-2.884960],[-12.279840,-2.479970],[-12.259840,-2.199970],[-12.239840,-1.919980],[-12.149840,-1.604980],[-12.119840,-1.319980],[-12.139840,-1.019990],[-12.159840,-0.719990],[-12.029840,-0.245000],[-11.479850,0.319990],[-10.534860,1.044990],[-7.639900,1.559980],[-7.177414,2.401224],[-6.279920,3.189960],[-3.959950,4.999930]]);
  }
}

module m(h)
{
  scale([25.4/90, -25.4/90, 1]) union()
  {
    linear_extrude(height=h)
      polygon([[14.228490,14.003905],[8.564430,14.003905],[8.564430,-2.753905],[8.798810,-8.750005],[8.642560,-8.750005],[8.330060,-7.500005],[7.978490,-6.318365],[7.636700,-5.322265],[7.353490,-4.609375],[2.040990,5.605465],[-2.373070,5.605465],[-7.509790,-4.648445],[-7.724630,-5.205085],[-8.017600,-6.123055],[-8.339860,-7.324225],[-8.623070,-8.750005],[-8.798850,-8.750005],[-8.603540,-5.371095],[-8.544940,-2.773445],[-8.544940,14.003905],[-14.228540,14.003905],[-14.228540,-14.003905],[-6.494160,-14.003905],[-1.552760,-4.277345],[-1.123070,-3.281255],[-0.703150,-2.226565],[-0.332050,-1.201175],[-0.087910,-0.273445],[0.009790,-0.273445],[0.263700,-1.240235],[0.556670,-2.324225],[0.888700,-3.388675],[1.259790,-4.316405],[6.337920,-14.003905],[14.228540,-14.003905]]);
  }
}

module sheeps(h)
{
  scale([25.4/90, -25.4/90, 1]) union()
  { 
    linear_extrude(height=h)
      polygon([[5.3467,8.9794],[4.6045,8.804],[4.1718,5.893],[3.7111,3.0837],[3.2538,3.0816],[3.0304,3.0816],[2.351,2.8741],[2.0779,2.7599],[1.8073,2.7137],[1.6758,2.8451],[2.5833,7.2972],[2.7336,7.617],[2.8565,8.0172],[2.8565,8.0975],[1.8965,8.1559],[0.9365,8.1559],[0.9365,7.7187],[0.9365,7.2846],[0.1925,2.429],[0.1721,2.4086],[-0.4605,2.7361],[-1.6356,3.3929],[-4.1018,2.8729],[-4.3335,2.7999],[-4.4876,3.0317],[-4.5309,3.1723],[-4.8466,4.0107],[-5.1268,4.7341],[-4.8186,5.9993],[-4.649,6.6951],[-4.3241,7.6348],[-4.2216,7.8385],[-4.1378,8.1491],[-4.1378,8.3331],[-5.714,8.1574],[-5.9713,7.7411],[-6.6064,3.7443],[-6.6064,2.9195],[-6.8233,2.8612],[-6.9426,2.907],[-7.4189,2.9444],[-7.7427,2.9444],[-8.3861,3.9311],[-8.9746,4.9178],[-8.6509,6.2891],[-8.4729,7.0433],[-8.0154,8.1199],[-7.8438,8.3727],[-7.7035,8.6959],[-7.7035,8.9067],[-8.8151,8.8953],[-9.4508,8.811],[-9.5654,8.31],[-9.6122,8.0367],[-10.1195,5.833],[-10.5773,3.8999],[-10.3705,3.1967],[-10.1525,2.5406],[-10.6951,2.0225],[-11.1301,1.6071],[-11.4026,0.7047],[-11.4933,0.2648],[-11.4865,-0.4184],[-11.4419,-0.5961],[-11.5573,-0.8355],[-11.8552,-1.0196],[-12.2262,-2.749],[-12.228,-3.167],[-11.9695,-3.9213],[-11.7429,-4.3442],[-11.8961,-4.7421],[-11.9985,-4.9271],[-12.0872,-5.387],[-12.0899,-5.5567],[-12.208,-5.6956],[-12.5346,-5.6956],[-12.9902,-3.898],[-13.1975,-2.5983],[-13.9263,-1.8793],[-14.6278,-1.7414],[-14.299,-6.005],[-13.9053,-6.8127],[-12.5557,-7.5118],[-12.1216,-7.6279],[-11.9549,-7.9251],[-11.9549,-8.3374],[-11.0885,-9.3201],[-10.3569,-9.8781],[-8.3206,-10.0787],[-7.5074,-10.0631],[-6.4692,-10.3407],[-5.426,-10.7322],[-3.5813,-10.2752],[-2.7848,-9.9178],[-1.987,-10.3095],[-1.2889,-10.6523],[0.0451,-10.7013],[1.0402,-10.7013],[1.8364,-10.4083],[2.3935,-10.1154],[2.5221,-10.3971],[2.5929,-10.5521],[2.8565,-10.7716],[2.9696,-10.8226],[3.3689,-11.0228],[3.5376,-11.11],[3.9861,-11.1834],[4.4018,-11.1862],[4.8451,-11.9303],[5.4978,-13.2232],[8.3765,-13.2801],[8.8102,-13.1286],[9.1651,-13.1095],[9.1651,-13.1671],[9.6962,-13.304],[10.2649,-13.4001],[11.5451,-12.7189],[11.9178,-12.388],[12.3164,-10.928],[12.3186,-10.5889],[12.8791,-9.8331],[13.6176,-8.9942],[14.513,-6.8658],[14.7943,-5.6074],[13.0219,-4.5984],[12.7973,-4.5984],[11.6927,-5.0784],[11.1738,-5.3489],[10.3113,-5.5584],[9.9091,-5.5584],[9.8508,-5.2087],[9.8508,-4.6211],[8.9189,-3.8714],[8.3879,-3.6589],[8.3879,-2.8396],[8.3879,-1.6859],[6.9904,-0.0455],[6.3929,0.3499],[6.3323,1.0091],[6.2926,2.2457],[5.6546,2.8926],[5.3979,3.0309],[5.1879,3.2455],[5.1879,4.0211],[6.0172,8.1023],[6.4876,9.092],[5.3467,8.9794]]);
  } 
}
